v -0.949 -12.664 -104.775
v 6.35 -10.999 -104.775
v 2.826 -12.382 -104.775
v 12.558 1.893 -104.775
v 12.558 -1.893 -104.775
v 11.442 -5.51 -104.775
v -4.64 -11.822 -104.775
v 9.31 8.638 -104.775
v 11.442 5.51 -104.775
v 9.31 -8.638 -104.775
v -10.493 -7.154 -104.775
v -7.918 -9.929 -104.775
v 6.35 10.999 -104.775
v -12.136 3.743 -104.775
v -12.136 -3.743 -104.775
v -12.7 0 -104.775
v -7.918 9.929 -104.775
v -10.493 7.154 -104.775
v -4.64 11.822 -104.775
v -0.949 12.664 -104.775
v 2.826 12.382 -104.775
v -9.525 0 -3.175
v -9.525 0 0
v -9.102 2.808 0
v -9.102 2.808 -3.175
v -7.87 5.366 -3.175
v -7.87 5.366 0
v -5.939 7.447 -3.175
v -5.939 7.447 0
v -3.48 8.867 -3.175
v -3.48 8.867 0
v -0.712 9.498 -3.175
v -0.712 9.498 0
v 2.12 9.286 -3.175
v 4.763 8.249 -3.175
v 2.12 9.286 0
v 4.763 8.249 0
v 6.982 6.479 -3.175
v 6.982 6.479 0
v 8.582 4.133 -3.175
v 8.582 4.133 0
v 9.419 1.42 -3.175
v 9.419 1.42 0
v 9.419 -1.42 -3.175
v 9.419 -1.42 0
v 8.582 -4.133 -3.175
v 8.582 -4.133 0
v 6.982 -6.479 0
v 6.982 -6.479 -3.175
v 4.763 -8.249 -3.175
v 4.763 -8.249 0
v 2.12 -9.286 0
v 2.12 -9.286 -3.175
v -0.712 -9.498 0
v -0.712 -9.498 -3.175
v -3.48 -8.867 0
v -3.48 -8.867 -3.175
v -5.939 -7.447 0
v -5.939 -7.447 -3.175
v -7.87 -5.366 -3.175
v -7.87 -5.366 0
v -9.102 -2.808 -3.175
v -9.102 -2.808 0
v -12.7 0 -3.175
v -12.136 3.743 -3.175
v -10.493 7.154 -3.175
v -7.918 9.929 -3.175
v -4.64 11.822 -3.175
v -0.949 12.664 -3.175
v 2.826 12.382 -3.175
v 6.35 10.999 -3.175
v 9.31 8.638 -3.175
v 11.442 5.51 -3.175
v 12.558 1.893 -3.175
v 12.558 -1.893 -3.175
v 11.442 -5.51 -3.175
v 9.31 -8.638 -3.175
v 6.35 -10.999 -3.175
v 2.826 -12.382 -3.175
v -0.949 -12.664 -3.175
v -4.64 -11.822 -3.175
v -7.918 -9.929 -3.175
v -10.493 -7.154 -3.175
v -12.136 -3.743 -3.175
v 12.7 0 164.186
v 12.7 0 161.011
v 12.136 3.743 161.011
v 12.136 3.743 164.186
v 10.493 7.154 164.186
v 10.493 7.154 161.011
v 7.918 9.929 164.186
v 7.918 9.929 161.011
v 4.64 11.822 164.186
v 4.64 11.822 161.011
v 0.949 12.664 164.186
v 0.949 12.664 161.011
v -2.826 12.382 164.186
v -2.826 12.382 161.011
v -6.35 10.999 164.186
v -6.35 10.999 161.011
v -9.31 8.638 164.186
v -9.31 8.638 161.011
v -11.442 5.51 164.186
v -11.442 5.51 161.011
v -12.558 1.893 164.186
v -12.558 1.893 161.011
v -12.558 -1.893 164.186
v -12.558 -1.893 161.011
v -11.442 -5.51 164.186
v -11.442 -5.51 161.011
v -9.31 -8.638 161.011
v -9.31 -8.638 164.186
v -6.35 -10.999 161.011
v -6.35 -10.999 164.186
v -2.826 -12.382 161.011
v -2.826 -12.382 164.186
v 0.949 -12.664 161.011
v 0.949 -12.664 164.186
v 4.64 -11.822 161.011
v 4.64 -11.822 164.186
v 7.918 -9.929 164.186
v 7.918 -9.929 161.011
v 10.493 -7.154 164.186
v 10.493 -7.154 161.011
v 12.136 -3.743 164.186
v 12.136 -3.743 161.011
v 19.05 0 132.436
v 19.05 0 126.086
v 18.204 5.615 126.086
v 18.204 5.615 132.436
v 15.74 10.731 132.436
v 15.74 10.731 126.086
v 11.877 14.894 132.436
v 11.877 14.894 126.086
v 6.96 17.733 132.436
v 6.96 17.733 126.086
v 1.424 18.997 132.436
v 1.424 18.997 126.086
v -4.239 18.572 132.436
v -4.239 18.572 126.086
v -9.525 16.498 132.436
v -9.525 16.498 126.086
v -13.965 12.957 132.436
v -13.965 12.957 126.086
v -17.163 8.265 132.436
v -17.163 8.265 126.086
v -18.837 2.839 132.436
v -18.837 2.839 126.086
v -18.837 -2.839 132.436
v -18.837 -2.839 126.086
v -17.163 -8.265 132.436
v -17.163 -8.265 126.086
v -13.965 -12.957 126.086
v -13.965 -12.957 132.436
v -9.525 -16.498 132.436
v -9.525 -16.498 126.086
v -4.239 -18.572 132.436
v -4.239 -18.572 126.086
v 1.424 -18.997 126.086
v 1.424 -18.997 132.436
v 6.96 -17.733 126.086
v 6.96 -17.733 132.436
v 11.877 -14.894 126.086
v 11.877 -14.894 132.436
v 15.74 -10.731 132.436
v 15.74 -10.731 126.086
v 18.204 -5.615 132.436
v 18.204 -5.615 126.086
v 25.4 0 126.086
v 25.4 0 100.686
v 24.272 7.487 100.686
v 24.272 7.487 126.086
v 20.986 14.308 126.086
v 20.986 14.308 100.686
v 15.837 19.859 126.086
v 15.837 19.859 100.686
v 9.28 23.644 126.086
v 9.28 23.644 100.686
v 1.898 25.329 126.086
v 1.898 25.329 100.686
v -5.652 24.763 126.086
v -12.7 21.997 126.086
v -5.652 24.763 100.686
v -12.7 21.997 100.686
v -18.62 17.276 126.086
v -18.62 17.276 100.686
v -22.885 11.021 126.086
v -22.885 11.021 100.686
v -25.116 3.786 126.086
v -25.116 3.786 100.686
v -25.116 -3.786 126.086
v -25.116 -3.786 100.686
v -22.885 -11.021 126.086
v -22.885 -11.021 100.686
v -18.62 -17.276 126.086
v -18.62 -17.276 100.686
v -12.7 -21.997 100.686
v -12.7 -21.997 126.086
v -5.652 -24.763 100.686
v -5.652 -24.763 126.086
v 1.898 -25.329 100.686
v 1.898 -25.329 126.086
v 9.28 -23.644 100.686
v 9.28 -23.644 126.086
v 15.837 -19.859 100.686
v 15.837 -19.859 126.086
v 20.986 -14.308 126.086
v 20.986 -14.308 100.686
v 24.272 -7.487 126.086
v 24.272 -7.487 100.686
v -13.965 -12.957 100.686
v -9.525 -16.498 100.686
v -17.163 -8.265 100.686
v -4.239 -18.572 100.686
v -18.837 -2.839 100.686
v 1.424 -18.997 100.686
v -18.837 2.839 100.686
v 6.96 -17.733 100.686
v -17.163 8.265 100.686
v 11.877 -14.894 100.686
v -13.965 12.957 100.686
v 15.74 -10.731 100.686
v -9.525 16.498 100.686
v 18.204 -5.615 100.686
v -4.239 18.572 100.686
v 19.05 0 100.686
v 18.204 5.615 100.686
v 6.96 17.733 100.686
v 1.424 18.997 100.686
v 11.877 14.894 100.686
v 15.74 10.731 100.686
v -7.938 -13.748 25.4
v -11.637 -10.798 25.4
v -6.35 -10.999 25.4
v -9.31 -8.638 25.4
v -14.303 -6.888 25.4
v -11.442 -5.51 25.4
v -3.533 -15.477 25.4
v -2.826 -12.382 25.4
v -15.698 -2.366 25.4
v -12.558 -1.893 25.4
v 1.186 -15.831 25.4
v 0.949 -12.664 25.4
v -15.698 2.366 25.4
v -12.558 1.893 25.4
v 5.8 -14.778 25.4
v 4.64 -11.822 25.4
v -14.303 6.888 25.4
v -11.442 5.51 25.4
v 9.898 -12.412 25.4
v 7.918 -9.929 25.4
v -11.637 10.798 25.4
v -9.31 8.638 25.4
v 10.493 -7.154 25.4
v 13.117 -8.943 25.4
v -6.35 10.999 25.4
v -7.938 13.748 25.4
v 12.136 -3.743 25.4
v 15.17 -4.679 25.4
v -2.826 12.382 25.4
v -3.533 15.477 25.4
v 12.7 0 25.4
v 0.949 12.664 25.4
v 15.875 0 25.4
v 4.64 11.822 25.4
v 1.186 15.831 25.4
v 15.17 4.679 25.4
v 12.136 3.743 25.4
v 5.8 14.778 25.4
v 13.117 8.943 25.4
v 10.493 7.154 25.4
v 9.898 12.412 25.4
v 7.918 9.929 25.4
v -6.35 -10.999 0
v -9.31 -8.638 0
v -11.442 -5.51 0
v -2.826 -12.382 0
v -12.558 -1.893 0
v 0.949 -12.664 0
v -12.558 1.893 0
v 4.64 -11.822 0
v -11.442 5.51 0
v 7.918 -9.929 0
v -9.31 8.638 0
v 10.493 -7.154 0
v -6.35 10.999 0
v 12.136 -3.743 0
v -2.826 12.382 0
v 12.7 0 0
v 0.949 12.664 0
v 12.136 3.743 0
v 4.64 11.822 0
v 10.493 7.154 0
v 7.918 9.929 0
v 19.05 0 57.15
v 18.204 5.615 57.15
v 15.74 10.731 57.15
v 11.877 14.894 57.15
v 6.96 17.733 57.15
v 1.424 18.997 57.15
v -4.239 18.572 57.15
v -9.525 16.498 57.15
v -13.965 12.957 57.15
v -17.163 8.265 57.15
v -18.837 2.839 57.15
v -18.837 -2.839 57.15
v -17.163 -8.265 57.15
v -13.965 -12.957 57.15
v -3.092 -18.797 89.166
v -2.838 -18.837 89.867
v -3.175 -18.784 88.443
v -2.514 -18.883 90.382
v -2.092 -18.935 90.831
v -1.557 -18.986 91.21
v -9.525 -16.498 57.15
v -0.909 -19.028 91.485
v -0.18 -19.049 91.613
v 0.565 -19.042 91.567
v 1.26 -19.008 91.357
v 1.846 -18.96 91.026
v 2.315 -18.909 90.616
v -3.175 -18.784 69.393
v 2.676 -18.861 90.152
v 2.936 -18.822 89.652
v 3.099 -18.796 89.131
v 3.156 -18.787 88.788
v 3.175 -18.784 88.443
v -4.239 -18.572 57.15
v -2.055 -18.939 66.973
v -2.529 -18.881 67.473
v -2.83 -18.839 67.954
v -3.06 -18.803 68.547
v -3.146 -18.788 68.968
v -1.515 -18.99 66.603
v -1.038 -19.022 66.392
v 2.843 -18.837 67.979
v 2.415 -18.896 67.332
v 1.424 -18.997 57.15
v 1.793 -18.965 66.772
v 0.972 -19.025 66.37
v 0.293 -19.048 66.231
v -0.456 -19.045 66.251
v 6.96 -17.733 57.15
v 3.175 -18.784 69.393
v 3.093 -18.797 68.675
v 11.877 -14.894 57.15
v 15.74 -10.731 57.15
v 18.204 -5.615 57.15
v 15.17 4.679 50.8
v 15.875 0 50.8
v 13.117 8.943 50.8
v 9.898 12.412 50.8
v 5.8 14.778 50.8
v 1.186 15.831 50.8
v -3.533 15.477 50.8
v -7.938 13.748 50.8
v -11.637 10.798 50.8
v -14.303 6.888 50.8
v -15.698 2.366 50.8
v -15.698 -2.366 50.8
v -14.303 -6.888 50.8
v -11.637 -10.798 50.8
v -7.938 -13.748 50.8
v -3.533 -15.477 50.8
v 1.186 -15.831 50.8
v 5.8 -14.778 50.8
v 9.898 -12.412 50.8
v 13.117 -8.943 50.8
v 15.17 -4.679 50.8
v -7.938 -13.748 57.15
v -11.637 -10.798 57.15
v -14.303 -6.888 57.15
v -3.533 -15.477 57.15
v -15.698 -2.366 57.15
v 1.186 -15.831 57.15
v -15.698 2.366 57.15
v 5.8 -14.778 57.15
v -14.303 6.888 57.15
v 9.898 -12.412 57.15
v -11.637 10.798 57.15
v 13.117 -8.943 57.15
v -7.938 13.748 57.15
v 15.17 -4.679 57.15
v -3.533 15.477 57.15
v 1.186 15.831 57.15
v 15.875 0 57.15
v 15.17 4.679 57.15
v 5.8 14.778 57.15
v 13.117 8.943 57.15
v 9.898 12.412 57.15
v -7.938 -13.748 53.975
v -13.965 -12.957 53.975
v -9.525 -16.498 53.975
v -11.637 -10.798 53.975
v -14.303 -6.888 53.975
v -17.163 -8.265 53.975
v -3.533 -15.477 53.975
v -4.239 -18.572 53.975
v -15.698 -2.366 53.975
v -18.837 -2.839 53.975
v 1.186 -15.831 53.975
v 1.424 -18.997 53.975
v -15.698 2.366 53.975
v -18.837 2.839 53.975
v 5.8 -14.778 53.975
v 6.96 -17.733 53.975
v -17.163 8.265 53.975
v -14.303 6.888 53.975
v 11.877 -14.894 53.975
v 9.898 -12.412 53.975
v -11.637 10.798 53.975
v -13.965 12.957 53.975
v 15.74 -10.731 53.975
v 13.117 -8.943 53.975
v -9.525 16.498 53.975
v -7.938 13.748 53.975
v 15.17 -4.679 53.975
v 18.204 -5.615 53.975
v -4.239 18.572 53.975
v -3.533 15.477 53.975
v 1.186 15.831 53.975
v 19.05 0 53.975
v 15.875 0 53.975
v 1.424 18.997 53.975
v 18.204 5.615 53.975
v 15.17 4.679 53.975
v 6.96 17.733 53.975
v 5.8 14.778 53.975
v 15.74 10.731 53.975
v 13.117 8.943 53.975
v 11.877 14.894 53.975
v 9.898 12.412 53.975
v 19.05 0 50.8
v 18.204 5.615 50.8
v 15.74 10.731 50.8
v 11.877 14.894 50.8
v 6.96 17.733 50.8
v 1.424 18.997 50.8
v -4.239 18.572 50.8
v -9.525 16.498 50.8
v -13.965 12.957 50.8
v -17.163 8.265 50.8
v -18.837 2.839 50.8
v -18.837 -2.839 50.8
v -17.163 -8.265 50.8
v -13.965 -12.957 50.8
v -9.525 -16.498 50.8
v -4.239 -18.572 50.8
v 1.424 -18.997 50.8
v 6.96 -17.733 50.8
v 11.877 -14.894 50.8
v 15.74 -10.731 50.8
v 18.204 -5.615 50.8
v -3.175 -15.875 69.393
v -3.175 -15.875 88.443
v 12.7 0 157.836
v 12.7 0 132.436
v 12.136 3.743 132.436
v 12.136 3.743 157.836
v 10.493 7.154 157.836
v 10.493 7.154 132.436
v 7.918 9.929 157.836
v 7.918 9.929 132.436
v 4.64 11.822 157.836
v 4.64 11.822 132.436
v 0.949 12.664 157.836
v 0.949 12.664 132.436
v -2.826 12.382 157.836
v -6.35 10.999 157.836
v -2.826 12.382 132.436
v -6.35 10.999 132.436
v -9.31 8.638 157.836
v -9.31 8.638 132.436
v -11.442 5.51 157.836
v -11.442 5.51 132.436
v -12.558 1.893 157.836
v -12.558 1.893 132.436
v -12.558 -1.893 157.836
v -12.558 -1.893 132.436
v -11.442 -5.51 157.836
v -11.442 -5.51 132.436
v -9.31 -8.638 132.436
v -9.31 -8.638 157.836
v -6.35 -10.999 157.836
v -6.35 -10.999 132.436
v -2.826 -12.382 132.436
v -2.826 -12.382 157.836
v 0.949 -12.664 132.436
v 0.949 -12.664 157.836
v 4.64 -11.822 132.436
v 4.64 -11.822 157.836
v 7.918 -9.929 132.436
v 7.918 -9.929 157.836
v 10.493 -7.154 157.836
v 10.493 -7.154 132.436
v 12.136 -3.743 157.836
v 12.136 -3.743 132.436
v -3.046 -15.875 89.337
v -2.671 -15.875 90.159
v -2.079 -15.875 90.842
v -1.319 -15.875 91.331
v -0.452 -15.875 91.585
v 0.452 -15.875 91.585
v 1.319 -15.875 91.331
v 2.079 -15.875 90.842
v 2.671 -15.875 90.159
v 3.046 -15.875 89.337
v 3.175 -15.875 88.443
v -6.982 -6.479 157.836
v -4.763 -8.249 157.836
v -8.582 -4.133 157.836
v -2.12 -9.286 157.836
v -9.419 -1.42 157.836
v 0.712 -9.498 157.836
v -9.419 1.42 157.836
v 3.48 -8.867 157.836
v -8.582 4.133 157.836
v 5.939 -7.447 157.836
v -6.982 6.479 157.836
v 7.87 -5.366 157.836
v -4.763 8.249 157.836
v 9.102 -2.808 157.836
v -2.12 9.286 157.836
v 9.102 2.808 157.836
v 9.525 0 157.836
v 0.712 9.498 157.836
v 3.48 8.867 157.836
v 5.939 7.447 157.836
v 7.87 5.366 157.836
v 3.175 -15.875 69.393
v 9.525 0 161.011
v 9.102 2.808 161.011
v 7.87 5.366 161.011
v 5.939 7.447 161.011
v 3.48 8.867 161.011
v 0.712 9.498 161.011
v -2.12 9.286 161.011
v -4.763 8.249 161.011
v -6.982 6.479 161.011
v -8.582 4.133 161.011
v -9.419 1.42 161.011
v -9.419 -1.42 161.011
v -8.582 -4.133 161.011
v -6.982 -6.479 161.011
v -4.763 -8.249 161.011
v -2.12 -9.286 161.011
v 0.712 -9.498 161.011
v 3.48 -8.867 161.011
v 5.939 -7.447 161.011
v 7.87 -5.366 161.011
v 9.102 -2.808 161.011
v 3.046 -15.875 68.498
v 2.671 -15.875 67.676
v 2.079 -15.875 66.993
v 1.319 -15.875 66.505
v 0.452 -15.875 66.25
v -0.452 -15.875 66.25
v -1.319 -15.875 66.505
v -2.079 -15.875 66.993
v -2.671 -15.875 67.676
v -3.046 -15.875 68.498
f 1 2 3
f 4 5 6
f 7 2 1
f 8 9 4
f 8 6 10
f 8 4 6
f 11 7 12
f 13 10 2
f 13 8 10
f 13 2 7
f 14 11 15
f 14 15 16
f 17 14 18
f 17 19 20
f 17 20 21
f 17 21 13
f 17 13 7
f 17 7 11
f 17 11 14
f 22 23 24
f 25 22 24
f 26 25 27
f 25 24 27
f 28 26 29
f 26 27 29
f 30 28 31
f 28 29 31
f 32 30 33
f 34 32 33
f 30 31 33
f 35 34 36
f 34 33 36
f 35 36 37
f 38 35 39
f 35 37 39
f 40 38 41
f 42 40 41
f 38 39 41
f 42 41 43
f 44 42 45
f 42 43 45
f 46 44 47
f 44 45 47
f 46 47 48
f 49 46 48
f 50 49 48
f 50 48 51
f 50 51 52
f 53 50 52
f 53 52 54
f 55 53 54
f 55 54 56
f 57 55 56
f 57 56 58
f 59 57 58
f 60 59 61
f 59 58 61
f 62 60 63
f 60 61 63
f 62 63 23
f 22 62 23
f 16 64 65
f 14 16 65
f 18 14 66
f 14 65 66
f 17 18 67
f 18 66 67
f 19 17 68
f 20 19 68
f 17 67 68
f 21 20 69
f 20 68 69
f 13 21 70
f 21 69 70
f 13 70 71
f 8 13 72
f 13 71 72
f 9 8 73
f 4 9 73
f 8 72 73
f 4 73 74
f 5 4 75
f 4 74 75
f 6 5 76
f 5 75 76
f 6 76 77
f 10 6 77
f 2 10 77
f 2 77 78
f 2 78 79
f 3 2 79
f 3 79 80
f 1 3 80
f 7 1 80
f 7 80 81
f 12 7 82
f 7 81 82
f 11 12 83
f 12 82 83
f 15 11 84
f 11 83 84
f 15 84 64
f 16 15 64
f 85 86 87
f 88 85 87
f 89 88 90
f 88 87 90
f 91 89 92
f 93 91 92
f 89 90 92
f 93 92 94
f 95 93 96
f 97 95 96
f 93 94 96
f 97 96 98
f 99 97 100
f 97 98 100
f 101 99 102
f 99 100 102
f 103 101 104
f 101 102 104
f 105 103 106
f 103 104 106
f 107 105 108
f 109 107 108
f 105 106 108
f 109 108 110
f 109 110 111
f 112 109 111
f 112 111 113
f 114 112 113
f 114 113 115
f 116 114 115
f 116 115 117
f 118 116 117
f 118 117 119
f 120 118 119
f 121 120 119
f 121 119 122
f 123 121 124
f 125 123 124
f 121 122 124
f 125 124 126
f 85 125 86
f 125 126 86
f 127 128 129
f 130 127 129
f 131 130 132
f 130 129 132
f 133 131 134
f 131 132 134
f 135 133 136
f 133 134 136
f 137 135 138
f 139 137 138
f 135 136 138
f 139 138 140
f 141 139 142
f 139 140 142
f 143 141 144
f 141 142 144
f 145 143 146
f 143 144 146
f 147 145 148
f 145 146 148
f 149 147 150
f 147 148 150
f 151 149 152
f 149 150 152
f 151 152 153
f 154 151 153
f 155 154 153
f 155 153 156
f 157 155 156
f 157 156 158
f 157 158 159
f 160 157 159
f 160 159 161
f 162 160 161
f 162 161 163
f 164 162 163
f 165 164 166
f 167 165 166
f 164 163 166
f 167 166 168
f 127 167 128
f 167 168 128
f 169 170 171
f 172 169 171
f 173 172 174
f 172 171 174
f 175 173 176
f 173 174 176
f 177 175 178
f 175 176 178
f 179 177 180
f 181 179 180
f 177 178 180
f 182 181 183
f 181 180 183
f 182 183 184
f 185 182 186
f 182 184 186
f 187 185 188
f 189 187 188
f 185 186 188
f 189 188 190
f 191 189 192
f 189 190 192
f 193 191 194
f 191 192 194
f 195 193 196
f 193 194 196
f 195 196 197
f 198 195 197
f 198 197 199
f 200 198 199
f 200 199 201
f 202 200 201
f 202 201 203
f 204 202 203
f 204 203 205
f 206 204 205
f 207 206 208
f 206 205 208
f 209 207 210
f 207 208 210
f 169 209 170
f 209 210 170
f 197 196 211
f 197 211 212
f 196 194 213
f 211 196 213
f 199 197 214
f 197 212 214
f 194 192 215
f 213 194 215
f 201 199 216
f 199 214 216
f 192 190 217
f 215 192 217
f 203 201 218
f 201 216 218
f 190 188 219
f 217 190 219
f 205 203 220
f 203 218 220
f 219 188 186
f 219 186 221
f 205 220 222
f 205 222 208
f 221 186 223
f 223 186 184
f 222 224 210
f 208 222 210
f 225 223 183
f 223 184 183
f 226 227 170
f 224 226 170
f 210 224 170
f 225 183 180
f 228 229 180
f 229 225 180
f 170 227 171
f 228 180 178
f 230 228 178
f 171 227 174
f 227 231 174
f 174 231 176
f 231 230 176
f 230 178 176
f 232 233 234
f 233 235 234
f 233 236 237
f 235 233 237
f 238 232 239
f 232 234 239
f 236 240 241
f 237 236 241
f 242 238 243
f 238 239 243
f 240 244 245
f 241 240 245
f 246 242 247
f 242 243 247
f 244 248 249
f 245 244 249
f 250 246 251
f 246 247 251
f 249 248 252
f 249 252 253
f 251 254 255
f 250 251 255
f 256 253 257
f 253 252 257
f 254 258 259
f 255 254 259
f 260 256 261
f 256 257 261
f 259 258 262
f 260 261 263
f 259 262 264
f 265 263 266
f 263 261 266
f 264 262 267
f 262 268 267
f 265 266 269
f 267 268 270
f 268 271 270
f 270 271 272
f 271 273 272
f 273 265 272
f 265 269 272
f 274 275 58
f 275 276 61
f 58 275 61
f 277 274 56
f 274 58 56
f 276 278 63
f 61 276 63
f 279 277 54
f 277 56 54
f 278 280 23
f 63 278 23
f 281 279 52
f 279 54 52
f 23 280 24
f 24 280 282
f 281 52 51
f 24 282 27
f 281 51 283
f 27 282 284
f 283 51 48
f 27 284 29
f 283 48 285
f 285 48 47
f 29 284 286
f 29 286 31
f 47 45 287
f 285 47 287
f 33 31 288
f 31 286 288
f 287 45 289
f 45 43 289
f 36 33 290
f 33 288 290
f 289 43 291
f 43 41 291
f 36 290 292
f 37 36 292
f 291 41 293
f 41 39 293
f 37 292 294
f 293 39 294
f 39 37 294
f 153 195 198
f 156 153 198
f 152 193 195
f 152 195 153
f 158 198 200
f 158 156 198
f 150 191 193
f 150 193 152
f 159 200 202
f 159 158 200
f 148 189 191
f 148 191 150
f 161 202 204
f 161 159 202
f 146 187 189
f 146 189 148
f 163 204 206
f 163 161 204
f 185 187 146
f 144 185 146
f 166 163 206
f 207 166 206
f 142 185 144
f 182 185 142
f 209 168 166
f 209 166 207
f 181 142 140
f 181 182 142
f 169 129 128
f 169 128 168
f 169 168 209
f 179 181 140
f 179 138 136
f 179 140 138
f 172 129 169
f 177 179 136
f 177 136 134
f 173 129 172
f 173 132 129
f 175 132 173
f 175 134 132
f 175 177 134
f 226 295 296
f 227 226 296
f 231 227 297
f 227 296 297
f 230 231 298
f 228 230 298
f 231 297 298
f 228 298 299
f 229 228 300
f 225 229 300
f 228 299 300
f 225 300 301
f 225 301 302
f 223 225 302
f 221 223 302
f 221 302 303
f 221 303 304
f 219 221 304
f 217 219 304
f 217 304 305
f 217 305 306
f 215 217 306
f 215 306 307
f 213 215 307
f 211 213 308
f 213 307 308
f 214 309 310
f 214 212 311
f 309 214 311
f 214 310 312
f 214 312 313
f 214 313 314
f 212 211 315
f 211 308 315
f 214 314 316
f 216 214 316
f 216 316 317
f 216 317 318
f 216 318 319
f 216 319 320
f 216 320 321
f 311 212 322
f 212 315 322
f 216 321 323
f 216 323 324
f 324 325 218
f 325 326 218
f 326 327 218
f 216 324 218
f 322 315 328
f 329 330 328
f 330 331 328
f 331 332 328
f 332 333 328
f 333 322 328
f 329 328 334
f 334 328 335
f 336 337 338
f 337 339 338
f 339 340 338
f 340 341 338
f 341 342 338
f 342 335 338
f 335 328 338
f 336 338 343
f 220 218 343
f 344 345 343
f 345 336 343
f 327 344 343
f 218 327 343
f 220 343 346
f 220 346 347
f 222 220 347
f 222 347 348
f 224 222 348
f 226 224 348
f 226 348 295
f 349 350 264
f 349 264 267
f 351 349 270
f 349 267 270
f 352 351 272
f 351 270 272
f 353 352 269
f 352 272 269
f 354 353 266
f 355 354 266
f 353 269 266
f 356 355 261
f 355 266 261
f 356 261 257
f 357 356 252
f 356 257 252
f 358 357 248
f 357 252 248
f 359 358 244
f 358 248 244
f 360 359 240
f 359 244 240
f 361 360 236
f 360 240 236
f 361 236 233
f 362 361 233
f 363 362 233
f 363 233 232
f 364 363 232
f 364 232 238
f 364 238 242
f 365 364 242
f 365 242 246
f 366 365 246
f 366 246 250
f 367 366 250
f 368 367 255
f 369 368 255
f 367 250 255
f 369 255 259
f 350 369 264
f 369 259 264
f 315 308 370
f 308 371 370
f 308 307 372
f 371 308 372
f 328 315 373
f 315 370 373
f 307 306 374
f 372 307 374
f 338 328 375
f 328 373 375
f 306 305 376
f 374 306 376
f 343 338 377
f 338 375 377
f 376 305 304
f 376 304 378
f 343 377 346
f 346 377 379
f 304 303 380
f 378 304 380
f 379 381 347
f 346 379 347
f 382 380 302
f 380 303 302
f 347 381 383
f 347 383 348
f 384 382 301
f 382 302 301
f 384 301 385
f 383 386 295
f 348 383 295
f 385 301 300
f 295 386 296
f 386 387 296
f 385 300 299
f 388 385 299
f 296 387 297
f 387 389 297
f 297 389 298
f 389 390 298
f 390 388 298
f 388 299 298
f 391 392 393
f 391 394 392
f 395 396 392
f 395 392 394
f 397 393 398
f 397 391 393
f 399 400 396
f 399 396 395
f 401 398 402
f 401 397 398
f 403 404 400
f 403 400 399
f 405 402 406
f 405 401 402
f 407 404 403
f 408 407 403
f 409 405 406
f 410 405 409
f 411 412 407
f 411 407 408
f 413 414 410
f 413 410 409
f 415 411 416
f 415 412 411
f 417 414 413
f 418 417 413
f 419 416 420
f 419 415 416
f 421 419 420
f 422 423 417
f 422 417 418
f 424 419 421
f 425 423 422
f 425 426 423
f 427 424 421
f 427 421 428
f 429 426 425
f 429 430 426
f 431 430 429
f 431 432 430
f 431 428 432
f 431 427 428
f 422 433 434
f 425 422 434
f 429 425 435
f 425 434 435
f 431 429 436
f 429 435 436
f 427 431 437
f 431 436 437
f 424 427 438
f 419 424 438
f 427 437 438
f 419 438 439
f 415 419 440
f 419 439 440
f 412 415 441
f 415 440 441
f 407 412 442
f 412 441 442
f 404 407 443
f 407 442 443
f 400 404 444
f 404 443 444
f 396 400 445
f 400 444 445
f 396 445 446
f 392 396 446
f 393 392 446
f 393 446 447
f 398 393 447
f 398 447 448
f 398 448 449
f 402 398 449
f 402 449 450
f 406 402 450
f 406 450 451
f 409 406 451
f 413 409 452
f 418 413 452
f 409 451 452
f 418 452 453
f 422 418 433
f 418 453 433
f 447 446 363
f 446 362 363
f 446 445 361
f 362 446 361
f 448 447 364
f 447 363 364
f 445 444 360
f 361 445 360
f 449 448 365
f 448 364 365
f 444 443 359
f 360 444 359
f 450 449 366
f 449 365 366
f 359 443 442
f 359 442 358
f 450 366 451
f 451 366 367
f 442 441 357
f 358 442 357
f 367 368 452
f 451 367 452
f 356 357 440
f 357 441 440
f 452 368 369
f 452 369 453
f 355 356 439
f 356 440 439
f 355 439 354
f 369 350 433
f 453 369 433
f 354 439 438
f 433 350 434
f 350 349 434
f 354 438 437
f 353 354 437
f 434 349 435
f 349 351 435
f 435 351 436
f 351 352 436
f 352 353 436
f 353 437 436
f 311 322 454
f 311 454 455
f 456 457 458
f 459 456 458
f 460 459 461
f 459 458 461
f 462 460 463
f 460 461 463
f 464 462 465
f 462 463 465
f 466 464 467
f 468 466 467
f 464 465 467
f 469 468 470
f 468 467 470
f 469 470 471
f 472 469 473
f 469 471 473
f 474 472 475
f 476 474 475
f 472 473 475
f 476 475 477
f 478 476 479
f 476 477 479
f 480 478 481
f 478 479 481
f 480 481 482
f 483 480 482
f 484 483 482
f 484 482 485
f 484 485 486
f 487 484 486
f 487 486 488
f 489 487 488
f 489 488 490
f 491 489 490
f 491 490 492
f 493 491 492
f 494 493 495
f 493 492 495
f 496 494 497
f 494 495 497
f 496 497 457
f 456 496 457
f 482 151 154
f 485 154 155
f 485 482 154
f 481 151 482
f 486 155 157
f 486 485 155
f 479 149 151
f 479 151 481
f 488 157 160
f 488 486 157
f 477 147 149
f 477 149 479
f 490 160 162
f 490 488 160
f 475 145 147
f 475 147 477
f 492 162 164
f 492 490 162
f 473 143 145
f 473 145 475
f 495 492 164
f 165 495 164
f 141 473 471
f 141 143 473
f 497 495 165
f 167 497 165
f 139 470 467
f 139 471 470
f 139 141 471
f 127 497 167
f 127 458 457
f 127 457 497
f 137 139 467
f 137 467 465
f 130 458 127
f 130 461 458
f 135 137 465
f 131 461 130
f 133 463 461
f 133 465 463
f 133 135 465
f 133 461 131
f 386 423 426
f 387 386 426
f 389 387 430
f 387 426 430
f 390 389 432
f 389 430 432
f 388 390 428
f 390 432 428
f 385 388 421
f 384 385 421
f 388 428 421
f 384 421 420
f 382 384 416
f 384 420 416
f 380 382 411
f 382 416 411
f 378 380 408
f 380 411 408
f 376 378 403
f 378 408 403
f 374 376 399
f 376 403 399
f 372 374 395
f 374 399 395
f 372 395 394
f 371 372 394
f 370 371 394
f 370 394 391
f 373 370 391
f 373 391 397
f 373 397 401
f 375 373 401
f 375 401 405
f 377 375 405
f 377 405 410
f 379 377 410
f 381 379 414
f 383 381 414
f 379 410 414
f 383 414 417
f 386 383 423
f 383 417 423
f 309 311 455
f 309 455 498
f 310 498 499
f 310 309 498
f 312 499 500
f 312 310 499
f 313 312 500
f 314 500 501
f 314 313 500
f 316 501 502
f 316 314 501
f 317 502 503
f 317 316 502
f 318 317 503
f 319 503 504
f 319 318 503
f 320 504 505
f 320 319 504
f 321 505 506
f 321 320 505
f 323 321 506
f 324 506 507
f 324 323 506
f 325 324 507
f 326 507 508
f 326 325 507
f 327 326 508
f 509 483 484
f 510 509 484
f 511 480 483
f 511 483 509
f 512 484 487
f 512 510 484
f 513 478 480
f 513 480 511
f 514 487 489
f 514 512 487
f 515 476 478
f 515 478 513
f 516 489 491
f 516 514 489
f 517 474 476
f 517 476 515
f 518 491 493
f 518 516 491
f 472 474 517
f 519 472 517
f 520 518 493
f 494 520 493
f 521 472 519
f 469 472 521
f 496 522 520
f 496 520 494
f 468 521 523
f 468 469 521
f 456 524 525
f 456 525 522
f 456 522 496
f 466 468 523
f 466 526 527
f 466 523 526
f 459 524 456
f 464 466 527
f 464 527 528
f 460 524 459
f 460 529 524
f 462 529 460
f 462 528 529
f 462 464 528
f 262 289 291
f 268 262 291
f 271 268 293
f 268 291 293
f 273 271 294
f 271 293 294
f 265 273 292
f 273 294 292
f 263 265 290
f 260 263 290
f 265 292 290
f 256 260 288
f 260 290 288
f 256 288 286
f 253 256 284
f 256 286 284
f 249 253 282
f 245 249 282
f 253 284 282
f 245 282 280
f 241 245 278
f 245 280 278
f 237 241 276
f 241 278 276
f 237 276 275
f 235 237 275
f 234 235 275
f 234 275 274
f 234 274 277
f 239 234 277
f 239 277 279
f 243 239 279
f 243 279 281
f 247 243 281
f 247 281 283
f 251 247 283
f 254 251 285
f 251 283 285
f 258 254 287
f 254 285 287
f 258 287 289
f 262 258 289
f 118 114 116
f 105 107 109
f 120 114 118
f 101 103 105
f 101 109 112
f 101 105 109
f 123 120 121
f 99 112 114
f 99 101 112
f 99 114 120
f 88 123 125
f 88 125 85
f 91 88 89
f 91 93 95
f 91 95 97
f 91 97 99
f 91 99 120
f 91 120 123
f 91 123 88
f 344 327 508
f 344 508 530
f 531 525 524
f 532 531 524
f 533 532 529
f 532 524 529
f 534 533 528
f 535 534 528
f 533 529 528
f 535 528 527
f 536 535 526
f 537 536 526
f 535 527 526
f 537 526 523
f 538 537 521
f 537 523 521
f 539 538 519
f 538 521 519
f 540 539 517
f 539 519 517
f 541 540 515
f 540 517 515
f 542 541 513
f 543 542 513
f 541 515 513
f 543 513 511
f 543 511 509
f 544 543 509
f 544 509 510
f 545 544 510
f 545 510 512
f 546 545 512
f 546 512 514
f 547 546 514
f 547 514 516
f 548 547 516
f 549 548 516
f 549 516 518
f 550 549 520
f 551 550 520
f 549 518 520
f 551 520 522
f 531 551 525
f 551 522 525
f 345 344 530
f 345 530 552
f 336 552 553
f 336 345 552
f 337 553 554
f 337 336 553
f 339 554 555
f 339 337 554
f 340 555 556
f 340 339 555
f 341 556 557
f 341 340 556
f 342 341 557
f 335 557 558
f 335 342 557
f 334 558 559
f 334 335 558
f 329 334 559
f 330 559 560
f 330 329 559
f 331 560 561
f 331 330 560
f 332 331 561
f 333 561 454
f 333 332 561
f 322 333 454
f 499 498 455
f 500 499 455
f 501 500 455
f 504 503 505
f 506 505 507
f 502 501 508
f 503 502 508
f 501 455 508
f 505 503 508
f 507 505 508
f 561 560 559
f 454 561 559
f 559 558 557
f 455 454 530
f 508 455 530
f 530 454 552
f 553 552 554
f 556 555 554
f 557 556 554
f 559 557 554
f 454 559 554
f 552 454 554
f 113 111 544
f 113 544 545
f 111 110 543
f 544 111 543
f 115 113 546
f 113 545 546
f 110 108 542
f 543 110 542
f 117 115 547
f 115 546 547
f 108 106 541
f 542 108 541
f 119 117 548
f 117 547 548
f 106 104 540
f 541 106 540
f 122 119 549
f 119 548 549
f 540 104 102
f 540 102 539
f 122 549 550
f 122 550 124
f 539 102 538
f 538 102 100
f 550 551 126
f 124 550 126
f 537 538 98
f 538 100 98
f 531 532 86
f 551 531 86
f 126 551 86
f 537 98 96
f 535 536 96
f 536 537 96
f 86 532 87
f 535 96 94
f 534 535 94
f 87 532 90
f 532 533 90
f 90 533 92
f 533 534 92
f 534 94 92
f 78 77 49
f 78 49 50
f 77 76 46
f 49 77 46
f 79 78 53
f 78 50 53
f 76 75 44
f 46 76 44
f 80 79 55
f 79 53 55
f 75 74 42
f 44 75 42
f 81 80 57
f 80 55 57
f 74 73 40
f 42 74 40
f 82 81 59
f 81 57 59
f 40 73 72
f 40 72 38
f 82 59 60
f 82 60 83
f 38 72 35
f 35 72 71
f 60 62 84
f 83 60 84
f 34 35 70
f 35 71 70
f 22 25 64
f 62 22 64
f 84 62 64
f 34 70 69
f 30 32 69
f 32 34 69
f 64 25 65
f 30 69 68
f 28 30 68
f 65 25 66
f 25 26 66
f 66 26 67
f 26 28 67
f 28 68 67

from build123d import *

# Parameters (mm, degrees)
SKETCH2_R            = 12.7
BOSS_EXTRUDE1_DEPTH  = 25.4
SKETCH3_R            = 15.875
BOSS_EXTRUDE2_DEPTH  = 25.4
SKETCH4_R            = 19.05
BOSS_EXTRUDE3_DEPTH  = 3.175
SKETCH5_R            = 15.875
BOSS_EXTRUDE4_DEPTH  = 3.175
SKETCH6_R            = 19.05
BOSS_EXTRUDE5_DEPTH  = 43.5356
SKETCH7_R            = 25.4
BOSS_EXTRUDE6_DEPTH  = 25.4
SKETCH8_R            = 19.05
BOSS_EXTRUDE7_DEPTH  = 6.35
SKETCH9_R            = 12.7
BOSS_EXTRUDE8_DEPTH  = 25.4
CUT_EXTRUDE1_DEPTH   = 3.175
SKETCH11_R           = 9.525
BOSS_EXTRUDE9_DEPTH  = 3.175
SKETCH12_R           = 12.7
BOSS_EXTRUDE10_DEPTH = 101.6
SKETCH13_R           = 9.525
BOSS_EXTRUDE11_DEPTH = 3.175
SKETCH14_R           = 12.7
BOSS_EXTRUDE12_DEPTH = 3.175


with BuildPart() as part:
    # Sketch2 → Boss-Extrude1 (new body)
    with BuildSketch(Plane.XY):
        Circle(SKETCH2_R)
    extrude(amount=BOSS_EXTRUDE1_DEPTH)

    # Sketch3 → Boss-Extrude2 (add)
    with BuildSketch(Plane.XY.offset(25.4)):
        Circle(SKETCH3_R)
    extrude(amount=BOSS_EXTRUDE2_DEPTH)

    # Sketch4 → Boss-Extrude3 (add)
    with BuildSketch(Plane.XY.offset(50.8)):
        Circle(SKETCH4_R)
    extrude(amount=BOSS_EXTRUDE3_DEPTH)

    # Sketch5 → Boss-Extrude4 (add)
    with BuildSketch(Plane.XY.offset(53.975)):
        Circle(SKETCH5_R)
    extrude(amount=BOSS_EXTRUDE4_DEPTH)

    # Sketch6 → Boss-Extrude5 (add)
    with BuildSketch(Plane.XY.offset(57.15)):
        Circle(SKETCH6_R)
    extrude(amount=BOSS_EXTRUDE5_DEPTH)

    # Sketch7 → Boss-Extrude6 (add)
    with BuildSketch(Plane.XY.offset(100.6856)):
        Circle(SKETCH7_R)
    extrude(amount=BOSS_EXTRUDE6_DEPTH)

    # Sketch8 → Boss-Extrude7 (add)
    with BuildSketch(Plane.XY.offset(126.0856)):
        Circle(SKETCH8_R)
    extrude(amount=BOSS_EXTRUDE7_DEPTH)

    # Sketch9 → Boss-Extrude8 (add)
    with BuildSketch(Plane.XY.offset(132.4356)):
        Circle(SKETCH9_R)
    extrude(amount=BOSS_EXTRUDE8_DEPTH)

    # Sketch10 → Cut-Extrude1 (cut)
    with BuildSketch(Plane(origin=(0, -19.05, 0), x_dir=(-1, 0, 0), z_dir=(0, -1, 0))):
        with BuildLine():
            Line((3.175, -69.3928), (3.175, -88.4428))
            ThreePointArc((3.175, -88.4428), (0, -91.6178), (-3.175, -88.4428))
            Line((-3.175, -88.4428), (-3.175, -69.3928))
            ThreePointArc((-3.175, -69.3928), (0, -66.2178), (3.175, -69.3928))
        make_face()
    extrude(amount=-CUT_EXTRUDE1_DEPTH, mode=Mode.SUBTRACT)

    # Sketch11 → Boss-Extrude9 (add)
    with BuildSketch(Plane(origin=(0, 0, 0), x_dir=(-1, 0, 0), z_dir=(0, 0, -1))):
        Circle(SKETCH11_R)
    extrude(amount=BOSS_EXTRUDE9_DEPTH)

    # Sketch12 → Boss-Extrude10 (add)
    with BuildSketch(Plane(origin=(0, 0, -3.175), x_dir=(-1, 0, 0), z_dir=(0, 0, -1))):
        Circle(SKETCH12_R)
    extrude(amount=BOSS_EXTRUDE10_DEPTH)

    # Sketch13 → Boss-Extrude11 (add)
    with BuildSketch(Plane.XY.offset(157.8356)):
        Circle(SKETCH13_R)
    extrude(amount=BOSS_EXTRUDE11_DEPTH)

    # Sketch14 → Boss-Extrude12 (add)
    with BuildSketch(Plane.XY.offset(161.0106)):
        Circle(SKETCH14_R)
    extrude(amount=BOSS_EXTRUDE12_DEPTH)


solid = part.part
